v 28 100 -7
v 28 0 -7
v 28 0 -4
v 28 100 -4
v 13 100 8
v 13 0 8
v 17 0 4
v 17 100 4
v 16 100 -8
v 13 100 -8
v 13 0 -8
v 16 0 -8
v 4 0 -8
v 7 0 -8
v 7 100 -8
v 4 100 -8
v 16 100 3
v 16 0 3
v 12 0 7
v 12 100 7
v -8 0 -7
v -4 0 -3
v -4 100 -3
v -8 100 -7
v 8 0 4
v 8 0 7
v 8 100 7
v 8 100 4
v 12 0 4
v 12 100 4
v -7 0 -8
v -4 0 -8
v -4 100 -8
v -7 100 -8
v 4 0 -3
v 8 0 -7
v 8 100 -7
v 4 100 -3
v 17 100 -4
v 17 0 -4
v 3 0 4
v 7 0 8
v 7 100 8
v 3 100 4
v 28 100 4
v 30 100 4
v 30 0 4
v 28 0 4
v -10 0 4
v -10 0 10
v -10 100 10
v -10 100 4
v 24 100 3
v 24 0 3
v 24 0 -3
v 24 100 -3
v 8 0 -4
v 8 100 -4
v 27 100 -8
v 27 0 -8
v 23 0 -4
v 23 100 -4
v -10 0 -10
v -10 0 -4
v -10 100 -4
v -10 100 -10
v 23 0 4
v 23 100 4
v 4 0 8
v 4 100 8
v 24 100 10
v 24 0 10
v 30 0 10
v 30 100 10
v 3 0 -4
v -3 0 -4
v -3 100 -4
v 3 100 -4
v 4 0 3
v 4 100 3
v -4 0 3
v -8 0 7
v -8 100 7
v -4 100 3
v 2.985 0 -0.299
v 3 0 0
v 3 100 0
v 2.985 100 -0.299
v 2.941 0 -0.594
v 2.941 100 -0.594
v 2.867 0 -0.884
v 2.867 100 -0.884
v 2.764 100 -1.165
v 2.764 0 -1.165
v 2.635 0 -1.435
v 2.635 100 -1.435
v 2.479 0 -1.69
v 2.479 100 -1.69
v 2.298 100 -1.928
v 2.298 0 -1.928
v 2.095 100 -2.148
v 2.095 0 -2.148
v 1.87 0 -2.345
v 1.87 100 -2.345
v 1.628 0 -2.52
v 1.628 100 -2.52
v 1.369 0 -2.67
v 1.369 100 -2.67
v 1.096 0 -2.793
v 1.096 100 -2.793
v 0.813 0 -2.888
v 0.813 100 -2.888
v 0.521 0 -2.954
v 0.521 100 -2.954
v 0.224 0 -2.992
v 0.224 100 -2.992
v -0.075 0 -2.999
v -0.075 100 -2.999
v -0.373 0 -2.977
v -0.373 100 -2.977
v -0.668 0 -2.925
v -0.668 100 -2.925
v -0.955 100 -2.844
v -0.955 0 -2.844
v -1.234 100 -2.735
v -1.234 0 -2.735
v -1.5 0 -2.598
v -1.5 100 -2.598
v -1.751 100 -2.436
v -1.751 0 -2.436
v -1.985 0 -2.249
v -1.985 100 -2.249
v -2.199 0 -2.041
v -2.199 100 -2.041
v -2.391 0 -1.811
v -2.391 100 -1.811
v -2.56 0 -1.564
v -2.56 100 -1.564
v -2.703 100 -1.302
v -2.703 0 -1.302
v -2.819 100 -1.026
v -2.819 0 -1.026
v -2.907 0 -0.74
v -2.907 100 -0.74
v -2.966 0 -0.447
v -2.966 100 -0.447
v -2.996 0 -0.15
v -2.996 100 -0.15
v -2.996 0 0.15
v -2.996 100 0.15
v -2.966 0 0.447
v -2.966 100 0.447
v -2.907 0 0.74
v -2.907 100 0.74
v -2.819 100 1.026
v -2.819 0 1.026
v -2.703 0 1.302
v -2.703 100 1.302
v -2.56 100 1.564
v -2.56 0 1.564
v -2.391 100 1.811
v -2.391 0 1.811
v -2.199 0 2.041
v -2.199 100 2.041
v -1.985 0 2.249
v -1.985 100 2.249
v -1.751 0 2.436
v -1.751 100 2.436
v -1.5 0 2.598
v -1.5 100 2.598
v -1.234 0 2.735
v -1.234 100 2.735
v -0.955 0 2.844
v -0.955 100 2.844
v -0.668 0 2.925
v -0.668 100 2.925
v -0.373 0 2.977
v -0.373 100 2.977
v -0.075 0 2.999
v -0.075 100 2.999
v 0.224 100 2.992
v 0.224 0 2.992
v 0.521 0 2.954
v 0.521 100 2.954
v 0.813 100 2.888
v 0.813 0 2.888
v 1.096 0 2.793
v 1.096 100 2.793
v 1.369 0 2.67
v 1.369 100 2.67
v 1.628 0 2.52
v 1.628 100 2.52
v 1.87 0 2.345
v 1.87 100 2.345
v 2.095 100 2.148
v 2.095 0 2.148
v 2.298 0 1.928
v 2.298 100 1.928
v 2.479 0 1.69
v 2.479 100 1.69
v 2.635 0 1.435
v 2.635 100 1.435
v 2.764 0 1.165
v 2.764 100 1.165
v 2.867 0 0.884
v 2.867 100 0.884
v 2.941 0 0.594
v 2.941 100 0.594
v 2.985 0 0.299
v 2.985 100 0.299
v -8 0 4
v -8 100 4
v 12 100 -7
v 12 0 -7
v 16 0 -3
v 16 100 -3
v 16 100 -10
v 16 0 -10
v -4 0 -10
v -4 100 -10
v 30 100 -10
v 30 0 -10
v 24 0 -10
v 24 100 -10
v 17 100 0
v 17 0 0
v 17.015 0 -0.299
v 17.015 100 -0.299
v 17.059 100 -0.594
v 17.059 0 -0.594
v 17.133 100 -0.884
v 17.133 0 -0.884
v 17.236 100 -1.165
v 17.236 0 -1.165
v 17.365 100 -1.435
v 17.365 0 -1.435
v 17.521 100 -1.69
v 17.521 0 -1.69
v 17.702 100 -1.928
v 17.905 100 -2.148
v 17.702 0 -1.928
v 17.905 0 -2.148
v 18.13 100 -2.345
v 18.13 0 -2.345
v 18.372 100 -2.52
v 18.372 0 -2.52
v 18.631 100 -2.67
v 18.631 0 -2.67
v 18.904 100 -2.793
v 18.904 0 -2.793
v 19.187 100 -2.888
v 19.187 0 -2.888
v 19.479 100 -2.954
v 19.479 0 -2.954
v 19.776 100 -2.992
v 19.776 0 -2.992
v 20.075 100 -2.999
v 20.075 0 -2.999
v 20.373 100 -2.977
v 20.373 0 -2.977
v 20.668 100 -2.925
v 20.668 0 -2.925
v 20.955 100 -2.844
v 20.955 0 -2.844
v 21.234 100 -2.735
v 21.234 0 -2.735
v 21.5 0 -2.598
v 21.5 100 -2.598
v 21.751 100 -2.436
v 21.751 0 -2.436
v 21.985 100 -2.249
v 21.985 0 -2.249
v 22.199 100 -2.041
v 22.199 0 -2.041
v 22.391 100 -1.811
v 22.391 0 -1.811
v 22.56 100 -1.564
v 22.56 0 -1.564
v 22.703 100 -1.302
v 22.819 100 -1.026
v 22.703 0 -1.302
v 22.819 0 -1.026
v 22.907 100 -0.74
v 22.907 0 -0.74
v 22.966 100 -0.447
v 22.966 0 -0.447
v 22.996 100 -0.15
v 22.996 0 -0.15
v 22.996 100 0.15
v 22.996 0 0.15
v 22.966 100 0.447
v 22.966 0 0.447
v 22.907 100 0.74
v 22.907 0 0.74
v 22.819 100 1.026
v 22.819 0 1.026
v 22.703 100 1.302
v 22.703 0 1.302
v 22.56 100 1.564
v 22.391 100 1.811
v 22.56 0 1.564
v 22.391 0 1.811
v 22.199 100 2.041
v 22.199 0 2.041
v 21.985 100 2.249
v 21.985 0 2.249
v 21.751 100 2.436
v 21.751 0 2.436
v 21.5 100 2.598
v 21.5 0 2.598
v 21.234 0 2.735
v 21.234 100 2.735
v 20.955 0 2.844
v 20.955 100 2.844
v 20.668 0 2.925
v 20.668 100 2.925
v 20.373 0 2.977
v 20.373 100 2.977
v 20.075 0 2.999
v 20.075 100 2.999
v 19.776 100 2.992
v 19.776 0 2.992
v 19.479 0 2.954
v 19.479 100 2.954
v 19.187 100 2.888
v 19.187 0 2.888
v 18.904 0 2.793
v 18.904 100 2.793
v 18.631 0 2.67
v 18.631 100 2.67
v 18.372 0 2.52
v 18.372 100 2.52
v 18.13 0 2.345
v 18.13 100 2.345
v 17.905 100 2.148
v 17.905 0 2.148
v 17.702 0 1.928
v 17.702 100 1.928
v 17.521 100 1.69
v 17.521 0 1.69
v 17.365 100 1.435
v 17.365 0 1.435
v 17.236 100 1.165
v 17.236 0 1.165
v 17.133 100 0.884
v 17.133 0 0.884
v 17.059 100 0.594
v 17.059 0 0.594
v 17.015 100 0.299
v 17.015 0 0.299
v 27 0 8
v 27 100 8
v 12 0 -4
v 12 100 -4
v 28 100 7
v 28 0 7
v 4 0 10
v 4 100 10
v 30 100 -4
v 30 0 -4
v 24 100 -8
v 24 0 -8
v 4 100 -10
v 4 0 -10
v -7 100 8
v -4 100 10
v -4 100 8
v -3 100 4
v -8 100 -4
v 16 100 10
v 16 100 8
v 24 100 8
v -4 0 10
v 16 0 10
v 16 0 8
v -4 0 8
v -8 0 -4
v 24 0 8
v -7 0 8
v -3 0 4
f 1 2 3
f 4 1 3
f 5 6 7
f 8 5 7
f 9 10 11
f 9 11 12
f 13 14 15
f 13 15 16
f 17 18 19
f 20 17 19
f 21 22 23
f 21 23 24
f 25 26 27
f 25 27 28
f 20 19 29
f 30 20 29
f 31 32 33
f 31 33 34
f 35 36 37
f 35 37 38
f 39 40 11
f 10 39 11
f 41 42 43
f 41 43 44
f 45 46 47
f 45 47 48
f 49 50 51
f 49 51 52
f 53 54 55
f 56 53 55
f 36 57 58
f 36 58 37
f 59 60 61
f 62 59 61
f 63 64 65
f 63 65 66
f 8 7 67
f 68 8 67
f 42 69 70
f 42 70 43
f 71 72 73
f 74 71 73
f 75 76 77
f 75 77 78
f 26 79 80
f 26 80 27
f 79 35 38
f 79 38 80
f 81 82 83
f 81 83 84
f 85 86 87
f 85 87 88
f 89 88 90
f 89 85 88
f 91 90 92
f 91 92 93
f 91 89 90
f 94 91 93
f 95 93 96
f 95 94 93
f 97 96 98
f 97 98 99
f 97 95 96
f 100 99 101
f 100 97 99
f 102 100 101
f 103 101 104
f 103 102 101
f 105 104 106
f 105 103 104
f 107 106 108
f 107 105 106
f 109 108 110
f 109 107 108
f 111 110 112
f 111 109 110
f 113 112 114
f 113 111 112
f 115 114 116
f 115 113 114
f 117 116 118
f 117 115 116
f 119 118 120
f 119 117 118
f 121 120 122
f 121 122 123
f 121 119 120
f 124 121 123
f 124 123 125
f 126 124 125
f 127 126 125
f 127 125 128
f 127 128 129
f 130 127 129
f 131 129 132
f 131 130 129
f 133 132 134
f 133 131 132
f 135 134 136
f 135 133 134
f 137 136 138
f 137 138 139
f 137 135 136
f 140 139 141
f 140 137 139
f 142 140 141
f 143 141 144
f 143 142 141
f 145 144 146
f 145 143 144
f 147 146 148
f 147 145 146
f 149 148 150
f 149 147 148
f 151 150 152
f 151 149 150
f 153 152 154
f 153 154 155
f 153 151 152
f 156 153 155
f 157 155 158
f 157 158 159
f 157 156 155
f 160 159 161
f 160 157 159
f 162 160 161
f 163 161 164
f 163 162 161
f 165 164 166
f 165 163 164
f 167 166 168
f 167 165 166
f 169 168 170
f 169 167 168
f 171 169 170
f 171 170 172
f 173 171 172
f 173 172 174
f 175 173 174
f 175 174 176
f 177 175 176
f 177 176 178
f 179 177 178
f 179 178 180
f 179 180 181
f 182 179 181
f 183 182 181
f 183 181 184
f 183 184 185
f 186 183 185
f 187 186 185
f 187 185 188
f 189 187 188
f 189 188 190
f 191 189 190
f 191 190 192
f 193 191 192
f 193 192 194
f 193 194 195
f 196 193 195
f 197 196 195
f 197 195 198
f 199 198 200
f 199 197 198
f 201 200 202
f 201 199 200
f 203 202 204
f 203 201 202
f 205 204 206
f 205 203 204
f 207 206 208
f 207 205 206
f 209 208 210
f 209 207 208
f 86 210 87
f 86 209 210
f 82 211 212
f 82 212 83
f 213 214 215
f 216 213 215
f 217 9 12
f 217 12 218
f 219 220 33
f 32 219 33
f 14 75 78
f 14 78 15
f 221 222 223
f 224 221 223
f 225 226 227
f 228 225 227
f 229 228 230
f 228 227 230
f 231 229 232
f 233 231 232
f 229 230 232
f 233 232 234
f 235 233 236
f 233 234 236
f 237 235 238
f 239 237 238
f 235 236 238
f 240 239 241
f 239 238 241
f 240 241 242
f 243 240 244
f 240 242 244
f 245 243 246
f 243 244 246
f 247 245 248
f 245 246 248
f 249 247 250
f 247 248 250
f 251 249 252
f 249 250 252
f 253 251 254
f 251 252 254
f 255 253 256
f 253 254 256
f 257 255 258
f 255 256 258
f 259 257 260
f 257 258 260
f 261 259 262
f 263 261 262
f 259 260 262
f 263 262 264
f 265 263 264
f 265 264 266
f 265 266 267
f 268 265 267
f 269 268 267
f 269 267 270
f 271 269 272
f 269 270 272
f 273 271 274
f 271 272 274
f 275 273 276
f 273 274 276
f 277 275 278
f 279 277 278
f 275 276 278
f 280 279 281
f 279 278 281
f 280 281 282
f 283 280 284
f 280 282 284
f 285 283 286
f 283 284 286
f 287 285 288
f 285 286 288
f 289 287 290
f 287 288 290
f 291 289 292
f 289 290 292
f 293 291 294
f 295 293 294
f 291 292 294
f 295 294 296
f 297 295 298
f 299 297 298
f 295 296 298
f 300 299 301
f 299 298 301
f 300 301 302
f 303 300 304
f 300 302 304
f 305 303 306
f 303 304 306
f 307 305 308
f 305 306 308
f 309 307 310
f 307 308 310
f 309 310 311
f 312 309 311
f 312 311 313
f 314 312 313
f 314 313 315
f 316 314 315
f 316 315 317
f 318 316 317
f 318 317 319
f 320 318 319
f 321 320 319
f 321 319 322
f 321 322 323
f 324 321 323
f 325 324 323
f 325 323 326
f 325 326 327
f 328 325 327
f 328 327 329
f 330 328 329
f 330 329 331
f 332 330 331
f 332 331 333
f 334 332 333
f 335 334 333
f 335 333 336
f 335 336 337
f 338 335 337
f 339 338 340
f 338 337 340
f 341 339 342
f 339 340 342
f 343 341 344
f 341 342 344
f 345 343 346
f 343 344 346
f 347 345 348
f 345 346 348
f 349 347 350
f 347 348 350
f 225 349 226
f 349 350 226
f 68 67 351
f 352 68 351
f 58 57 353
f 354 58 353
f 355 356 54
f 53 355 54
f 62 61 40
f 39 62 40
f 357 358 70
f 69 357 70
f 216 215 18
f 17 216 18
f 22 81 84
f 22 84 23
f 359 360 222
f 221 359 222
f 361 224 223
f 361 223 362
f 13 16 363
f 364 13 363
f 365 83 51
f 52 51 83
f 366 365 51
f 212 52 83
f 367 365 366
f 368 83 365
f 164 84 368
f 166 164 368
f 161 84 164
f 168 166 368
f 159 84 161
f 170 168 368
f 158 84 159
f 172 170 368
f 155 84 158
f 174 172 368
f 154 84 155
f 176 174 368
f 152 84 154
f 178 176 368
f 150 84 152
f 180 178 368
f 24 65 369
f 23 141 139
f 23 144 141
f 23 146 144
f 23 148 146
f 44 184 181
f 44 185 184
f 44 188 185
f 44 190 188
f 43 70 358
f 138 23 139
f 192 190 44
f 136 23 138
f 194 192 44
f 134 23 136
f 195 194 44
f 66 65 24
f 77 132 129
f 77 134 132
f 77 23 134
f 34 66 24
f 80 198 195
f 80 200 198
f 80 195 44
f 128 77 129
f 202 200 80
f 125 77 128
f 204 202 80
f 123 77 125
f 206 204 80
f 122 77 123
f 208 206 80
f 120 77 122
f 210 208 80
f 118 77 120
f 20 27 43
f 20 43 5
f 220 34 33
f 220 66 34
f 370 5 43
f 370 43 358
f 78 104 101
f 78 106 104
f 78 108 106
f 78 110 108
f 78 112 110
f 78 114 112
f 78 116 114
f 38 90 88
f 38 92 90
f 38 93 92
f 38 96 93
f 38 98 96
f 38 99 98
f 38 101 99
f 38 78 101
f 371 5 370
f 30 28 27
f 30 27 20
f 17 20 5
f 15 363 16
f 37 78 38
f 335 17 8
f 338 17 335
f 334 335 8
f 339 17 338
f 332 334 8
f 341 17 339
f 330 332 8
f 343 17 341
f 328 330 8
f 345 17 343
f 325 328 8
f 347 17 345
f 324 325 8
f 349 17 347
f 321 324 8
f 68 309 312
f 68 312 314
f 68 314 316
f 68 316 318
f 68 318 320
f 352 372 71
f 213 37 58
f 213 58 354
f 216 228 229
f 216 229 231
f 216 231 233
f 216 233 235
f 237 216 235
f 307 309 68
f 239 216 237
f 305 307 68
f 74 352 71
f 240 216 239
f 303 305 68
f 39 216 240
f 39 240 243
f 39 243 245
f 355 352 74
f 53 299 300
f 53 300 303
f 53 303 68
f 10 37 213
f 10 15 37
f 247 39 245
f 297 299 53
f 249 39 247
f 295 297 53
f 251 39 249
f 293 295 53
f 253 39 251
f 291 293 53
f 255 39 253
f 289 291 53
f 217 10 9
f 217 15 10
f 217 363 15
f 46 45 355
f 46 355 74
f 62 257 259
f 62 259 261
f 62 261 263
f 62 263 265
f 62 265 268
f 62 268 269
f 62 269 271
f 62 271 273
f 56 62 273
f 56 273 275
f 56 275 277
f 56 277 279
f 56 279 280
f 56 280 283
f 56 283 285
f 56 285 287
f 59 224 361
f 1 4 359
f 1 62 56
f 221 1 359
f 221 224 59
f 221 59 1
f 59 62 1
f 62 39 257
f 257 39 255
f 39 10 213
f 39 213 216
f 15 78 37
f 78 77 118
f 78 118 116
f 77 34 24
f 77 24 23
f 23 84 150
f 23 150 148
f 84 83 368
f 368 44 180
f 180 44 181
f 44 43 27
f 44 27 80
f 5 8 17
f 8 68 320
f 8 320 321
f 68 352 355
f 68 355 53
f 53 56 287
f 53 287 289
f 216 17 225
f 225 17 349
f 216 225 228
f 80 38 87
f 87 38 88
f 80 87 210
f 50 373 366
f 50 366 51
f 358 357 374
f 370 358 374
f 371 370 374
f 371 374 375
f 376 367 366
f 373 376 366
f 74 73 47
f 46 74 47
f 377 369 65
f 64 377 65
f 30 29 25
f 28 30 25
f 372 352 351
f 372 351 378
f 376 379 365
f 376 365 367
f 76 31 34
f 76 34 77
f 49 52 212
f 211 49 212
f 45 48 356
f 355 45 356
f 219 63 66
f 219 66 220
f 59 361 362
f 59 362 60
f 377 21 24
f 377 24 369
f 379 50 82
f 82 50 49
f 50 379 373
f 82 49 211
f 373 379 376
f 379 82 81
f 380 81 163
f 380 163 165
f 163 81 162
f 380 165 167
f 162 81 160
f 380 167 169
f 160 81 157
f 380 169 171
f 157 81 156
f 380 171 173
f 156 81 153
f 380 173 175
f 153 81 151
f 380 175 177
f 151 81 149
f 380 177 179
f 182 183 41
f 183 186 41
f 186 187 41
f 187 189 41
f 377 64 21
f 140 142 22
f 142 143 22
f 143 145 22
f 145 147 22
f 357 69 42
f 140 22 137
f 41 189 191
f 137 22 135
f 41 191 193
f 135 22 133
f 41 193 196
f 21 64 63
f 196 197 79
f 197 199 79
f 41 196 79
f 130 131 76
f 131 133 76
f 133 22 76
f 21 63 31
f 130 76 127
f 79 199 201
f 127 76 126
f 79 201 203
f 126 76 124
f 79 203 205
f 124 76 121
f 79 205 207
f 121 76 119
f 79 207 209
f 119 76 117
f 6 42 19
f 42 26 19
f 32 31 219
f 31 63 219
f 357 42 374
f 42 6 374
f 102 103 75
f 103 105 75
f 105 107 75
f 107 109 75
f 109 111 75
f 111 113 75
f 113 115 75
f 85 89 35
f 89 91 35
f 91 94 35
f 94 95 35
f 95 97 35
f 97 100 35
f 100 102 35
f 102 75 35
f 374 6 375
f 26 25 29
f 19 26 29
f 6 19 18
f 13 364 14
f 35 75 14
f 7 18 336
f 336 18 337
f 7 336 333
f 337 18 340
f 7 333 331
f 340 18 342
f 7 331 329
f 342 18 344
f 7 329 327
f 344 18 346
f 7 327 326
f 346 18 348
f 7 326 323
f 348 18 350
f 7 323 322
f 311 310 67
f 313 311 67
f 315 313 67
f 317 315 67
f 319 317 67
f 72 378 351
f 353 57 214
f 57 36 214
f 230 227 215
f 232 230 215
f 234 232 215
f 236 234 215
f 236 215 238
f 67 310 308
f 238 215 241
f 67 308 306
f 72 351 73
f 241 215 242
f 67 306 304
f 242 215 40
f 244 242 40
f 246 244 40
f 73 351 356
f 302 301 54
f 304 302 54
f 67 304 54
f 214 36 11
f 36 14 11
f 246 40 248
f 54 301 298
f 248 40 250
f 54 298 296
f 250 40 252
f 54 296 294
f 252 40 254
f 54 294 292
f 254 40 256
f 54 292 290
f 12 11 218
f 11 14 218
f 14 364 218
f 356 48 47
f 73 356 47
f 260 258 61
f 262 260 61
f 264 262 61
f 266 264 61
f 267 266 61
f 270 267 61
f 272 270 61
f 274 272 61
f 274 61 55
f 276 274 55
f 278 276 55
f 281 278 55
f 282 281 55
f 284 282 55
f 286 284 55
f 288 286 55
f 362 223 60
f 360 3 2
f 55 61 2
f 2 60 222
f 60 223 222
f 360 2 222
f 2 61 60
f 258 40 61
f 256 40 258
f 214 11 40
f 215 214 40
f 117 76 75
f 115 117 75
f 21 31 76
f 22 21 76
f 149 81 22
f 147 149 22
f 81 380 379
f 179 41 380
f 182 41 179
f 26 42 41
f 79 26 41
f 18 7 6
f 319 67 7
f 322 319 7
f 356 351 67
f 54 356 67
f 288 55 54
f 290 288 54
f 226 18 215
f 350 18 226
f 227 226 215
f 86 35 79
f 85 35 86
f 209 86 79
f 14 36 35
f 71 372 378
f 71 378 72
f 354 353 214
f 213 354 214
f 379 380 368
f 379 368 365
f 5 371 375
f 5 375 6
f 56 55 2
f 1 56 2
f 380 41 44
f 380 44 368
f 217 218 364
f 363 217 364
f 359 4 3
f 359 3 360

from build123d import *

# Parameters (mm, degrees)
F_2020_SKETCH_R     = 3
BOSS_EXTRUDE1_DEPTH = 100


with BuildPart() as part:
    # 2020 sketch → Boss-Extrude1 (new body)
    with BuildSketch(Plane(origin=(0, 0, 0), x_dir=(1, 0, 0), z_dir=(0, 1, 0))):
        Polygon((-4, 10), (-4, 8), (-7, 8), (-3, 4), (3, 4), (7, 8), (4, 8), (4, 10), (10, 10), (10, 4), (8, 4), (8, 7), (4, 3), (4, -3), (8, -7), (8, -4), (10, -4), (10, -10), (4, -10), (4, -8), (7, -8), (3, -4), (-3, -4), (-7, -8), (-4, -8), (-4, -10), (-10, -10), (-10, -4), (-8, -4), (-8, -7), (-4, -3), (-4, 3), (-8, 7), (-8, 4), (-10, 4), (-10, 10), align=None)
        Circle(F_2020_SKETCH_R, mode=Mode.SUBTRACT)
    boss_extrude1 = extrude(amount=BOSS_EXTRUDE1_DEPTH)

    # Mirror1: Boss-Extrude1 across plane
    add(boss_extrude1.mirror(Plane(origin=(10, 100, 4), x_dir=(0, 0, 1), z_dir=(1, 0, 0))))


solid = part.part
